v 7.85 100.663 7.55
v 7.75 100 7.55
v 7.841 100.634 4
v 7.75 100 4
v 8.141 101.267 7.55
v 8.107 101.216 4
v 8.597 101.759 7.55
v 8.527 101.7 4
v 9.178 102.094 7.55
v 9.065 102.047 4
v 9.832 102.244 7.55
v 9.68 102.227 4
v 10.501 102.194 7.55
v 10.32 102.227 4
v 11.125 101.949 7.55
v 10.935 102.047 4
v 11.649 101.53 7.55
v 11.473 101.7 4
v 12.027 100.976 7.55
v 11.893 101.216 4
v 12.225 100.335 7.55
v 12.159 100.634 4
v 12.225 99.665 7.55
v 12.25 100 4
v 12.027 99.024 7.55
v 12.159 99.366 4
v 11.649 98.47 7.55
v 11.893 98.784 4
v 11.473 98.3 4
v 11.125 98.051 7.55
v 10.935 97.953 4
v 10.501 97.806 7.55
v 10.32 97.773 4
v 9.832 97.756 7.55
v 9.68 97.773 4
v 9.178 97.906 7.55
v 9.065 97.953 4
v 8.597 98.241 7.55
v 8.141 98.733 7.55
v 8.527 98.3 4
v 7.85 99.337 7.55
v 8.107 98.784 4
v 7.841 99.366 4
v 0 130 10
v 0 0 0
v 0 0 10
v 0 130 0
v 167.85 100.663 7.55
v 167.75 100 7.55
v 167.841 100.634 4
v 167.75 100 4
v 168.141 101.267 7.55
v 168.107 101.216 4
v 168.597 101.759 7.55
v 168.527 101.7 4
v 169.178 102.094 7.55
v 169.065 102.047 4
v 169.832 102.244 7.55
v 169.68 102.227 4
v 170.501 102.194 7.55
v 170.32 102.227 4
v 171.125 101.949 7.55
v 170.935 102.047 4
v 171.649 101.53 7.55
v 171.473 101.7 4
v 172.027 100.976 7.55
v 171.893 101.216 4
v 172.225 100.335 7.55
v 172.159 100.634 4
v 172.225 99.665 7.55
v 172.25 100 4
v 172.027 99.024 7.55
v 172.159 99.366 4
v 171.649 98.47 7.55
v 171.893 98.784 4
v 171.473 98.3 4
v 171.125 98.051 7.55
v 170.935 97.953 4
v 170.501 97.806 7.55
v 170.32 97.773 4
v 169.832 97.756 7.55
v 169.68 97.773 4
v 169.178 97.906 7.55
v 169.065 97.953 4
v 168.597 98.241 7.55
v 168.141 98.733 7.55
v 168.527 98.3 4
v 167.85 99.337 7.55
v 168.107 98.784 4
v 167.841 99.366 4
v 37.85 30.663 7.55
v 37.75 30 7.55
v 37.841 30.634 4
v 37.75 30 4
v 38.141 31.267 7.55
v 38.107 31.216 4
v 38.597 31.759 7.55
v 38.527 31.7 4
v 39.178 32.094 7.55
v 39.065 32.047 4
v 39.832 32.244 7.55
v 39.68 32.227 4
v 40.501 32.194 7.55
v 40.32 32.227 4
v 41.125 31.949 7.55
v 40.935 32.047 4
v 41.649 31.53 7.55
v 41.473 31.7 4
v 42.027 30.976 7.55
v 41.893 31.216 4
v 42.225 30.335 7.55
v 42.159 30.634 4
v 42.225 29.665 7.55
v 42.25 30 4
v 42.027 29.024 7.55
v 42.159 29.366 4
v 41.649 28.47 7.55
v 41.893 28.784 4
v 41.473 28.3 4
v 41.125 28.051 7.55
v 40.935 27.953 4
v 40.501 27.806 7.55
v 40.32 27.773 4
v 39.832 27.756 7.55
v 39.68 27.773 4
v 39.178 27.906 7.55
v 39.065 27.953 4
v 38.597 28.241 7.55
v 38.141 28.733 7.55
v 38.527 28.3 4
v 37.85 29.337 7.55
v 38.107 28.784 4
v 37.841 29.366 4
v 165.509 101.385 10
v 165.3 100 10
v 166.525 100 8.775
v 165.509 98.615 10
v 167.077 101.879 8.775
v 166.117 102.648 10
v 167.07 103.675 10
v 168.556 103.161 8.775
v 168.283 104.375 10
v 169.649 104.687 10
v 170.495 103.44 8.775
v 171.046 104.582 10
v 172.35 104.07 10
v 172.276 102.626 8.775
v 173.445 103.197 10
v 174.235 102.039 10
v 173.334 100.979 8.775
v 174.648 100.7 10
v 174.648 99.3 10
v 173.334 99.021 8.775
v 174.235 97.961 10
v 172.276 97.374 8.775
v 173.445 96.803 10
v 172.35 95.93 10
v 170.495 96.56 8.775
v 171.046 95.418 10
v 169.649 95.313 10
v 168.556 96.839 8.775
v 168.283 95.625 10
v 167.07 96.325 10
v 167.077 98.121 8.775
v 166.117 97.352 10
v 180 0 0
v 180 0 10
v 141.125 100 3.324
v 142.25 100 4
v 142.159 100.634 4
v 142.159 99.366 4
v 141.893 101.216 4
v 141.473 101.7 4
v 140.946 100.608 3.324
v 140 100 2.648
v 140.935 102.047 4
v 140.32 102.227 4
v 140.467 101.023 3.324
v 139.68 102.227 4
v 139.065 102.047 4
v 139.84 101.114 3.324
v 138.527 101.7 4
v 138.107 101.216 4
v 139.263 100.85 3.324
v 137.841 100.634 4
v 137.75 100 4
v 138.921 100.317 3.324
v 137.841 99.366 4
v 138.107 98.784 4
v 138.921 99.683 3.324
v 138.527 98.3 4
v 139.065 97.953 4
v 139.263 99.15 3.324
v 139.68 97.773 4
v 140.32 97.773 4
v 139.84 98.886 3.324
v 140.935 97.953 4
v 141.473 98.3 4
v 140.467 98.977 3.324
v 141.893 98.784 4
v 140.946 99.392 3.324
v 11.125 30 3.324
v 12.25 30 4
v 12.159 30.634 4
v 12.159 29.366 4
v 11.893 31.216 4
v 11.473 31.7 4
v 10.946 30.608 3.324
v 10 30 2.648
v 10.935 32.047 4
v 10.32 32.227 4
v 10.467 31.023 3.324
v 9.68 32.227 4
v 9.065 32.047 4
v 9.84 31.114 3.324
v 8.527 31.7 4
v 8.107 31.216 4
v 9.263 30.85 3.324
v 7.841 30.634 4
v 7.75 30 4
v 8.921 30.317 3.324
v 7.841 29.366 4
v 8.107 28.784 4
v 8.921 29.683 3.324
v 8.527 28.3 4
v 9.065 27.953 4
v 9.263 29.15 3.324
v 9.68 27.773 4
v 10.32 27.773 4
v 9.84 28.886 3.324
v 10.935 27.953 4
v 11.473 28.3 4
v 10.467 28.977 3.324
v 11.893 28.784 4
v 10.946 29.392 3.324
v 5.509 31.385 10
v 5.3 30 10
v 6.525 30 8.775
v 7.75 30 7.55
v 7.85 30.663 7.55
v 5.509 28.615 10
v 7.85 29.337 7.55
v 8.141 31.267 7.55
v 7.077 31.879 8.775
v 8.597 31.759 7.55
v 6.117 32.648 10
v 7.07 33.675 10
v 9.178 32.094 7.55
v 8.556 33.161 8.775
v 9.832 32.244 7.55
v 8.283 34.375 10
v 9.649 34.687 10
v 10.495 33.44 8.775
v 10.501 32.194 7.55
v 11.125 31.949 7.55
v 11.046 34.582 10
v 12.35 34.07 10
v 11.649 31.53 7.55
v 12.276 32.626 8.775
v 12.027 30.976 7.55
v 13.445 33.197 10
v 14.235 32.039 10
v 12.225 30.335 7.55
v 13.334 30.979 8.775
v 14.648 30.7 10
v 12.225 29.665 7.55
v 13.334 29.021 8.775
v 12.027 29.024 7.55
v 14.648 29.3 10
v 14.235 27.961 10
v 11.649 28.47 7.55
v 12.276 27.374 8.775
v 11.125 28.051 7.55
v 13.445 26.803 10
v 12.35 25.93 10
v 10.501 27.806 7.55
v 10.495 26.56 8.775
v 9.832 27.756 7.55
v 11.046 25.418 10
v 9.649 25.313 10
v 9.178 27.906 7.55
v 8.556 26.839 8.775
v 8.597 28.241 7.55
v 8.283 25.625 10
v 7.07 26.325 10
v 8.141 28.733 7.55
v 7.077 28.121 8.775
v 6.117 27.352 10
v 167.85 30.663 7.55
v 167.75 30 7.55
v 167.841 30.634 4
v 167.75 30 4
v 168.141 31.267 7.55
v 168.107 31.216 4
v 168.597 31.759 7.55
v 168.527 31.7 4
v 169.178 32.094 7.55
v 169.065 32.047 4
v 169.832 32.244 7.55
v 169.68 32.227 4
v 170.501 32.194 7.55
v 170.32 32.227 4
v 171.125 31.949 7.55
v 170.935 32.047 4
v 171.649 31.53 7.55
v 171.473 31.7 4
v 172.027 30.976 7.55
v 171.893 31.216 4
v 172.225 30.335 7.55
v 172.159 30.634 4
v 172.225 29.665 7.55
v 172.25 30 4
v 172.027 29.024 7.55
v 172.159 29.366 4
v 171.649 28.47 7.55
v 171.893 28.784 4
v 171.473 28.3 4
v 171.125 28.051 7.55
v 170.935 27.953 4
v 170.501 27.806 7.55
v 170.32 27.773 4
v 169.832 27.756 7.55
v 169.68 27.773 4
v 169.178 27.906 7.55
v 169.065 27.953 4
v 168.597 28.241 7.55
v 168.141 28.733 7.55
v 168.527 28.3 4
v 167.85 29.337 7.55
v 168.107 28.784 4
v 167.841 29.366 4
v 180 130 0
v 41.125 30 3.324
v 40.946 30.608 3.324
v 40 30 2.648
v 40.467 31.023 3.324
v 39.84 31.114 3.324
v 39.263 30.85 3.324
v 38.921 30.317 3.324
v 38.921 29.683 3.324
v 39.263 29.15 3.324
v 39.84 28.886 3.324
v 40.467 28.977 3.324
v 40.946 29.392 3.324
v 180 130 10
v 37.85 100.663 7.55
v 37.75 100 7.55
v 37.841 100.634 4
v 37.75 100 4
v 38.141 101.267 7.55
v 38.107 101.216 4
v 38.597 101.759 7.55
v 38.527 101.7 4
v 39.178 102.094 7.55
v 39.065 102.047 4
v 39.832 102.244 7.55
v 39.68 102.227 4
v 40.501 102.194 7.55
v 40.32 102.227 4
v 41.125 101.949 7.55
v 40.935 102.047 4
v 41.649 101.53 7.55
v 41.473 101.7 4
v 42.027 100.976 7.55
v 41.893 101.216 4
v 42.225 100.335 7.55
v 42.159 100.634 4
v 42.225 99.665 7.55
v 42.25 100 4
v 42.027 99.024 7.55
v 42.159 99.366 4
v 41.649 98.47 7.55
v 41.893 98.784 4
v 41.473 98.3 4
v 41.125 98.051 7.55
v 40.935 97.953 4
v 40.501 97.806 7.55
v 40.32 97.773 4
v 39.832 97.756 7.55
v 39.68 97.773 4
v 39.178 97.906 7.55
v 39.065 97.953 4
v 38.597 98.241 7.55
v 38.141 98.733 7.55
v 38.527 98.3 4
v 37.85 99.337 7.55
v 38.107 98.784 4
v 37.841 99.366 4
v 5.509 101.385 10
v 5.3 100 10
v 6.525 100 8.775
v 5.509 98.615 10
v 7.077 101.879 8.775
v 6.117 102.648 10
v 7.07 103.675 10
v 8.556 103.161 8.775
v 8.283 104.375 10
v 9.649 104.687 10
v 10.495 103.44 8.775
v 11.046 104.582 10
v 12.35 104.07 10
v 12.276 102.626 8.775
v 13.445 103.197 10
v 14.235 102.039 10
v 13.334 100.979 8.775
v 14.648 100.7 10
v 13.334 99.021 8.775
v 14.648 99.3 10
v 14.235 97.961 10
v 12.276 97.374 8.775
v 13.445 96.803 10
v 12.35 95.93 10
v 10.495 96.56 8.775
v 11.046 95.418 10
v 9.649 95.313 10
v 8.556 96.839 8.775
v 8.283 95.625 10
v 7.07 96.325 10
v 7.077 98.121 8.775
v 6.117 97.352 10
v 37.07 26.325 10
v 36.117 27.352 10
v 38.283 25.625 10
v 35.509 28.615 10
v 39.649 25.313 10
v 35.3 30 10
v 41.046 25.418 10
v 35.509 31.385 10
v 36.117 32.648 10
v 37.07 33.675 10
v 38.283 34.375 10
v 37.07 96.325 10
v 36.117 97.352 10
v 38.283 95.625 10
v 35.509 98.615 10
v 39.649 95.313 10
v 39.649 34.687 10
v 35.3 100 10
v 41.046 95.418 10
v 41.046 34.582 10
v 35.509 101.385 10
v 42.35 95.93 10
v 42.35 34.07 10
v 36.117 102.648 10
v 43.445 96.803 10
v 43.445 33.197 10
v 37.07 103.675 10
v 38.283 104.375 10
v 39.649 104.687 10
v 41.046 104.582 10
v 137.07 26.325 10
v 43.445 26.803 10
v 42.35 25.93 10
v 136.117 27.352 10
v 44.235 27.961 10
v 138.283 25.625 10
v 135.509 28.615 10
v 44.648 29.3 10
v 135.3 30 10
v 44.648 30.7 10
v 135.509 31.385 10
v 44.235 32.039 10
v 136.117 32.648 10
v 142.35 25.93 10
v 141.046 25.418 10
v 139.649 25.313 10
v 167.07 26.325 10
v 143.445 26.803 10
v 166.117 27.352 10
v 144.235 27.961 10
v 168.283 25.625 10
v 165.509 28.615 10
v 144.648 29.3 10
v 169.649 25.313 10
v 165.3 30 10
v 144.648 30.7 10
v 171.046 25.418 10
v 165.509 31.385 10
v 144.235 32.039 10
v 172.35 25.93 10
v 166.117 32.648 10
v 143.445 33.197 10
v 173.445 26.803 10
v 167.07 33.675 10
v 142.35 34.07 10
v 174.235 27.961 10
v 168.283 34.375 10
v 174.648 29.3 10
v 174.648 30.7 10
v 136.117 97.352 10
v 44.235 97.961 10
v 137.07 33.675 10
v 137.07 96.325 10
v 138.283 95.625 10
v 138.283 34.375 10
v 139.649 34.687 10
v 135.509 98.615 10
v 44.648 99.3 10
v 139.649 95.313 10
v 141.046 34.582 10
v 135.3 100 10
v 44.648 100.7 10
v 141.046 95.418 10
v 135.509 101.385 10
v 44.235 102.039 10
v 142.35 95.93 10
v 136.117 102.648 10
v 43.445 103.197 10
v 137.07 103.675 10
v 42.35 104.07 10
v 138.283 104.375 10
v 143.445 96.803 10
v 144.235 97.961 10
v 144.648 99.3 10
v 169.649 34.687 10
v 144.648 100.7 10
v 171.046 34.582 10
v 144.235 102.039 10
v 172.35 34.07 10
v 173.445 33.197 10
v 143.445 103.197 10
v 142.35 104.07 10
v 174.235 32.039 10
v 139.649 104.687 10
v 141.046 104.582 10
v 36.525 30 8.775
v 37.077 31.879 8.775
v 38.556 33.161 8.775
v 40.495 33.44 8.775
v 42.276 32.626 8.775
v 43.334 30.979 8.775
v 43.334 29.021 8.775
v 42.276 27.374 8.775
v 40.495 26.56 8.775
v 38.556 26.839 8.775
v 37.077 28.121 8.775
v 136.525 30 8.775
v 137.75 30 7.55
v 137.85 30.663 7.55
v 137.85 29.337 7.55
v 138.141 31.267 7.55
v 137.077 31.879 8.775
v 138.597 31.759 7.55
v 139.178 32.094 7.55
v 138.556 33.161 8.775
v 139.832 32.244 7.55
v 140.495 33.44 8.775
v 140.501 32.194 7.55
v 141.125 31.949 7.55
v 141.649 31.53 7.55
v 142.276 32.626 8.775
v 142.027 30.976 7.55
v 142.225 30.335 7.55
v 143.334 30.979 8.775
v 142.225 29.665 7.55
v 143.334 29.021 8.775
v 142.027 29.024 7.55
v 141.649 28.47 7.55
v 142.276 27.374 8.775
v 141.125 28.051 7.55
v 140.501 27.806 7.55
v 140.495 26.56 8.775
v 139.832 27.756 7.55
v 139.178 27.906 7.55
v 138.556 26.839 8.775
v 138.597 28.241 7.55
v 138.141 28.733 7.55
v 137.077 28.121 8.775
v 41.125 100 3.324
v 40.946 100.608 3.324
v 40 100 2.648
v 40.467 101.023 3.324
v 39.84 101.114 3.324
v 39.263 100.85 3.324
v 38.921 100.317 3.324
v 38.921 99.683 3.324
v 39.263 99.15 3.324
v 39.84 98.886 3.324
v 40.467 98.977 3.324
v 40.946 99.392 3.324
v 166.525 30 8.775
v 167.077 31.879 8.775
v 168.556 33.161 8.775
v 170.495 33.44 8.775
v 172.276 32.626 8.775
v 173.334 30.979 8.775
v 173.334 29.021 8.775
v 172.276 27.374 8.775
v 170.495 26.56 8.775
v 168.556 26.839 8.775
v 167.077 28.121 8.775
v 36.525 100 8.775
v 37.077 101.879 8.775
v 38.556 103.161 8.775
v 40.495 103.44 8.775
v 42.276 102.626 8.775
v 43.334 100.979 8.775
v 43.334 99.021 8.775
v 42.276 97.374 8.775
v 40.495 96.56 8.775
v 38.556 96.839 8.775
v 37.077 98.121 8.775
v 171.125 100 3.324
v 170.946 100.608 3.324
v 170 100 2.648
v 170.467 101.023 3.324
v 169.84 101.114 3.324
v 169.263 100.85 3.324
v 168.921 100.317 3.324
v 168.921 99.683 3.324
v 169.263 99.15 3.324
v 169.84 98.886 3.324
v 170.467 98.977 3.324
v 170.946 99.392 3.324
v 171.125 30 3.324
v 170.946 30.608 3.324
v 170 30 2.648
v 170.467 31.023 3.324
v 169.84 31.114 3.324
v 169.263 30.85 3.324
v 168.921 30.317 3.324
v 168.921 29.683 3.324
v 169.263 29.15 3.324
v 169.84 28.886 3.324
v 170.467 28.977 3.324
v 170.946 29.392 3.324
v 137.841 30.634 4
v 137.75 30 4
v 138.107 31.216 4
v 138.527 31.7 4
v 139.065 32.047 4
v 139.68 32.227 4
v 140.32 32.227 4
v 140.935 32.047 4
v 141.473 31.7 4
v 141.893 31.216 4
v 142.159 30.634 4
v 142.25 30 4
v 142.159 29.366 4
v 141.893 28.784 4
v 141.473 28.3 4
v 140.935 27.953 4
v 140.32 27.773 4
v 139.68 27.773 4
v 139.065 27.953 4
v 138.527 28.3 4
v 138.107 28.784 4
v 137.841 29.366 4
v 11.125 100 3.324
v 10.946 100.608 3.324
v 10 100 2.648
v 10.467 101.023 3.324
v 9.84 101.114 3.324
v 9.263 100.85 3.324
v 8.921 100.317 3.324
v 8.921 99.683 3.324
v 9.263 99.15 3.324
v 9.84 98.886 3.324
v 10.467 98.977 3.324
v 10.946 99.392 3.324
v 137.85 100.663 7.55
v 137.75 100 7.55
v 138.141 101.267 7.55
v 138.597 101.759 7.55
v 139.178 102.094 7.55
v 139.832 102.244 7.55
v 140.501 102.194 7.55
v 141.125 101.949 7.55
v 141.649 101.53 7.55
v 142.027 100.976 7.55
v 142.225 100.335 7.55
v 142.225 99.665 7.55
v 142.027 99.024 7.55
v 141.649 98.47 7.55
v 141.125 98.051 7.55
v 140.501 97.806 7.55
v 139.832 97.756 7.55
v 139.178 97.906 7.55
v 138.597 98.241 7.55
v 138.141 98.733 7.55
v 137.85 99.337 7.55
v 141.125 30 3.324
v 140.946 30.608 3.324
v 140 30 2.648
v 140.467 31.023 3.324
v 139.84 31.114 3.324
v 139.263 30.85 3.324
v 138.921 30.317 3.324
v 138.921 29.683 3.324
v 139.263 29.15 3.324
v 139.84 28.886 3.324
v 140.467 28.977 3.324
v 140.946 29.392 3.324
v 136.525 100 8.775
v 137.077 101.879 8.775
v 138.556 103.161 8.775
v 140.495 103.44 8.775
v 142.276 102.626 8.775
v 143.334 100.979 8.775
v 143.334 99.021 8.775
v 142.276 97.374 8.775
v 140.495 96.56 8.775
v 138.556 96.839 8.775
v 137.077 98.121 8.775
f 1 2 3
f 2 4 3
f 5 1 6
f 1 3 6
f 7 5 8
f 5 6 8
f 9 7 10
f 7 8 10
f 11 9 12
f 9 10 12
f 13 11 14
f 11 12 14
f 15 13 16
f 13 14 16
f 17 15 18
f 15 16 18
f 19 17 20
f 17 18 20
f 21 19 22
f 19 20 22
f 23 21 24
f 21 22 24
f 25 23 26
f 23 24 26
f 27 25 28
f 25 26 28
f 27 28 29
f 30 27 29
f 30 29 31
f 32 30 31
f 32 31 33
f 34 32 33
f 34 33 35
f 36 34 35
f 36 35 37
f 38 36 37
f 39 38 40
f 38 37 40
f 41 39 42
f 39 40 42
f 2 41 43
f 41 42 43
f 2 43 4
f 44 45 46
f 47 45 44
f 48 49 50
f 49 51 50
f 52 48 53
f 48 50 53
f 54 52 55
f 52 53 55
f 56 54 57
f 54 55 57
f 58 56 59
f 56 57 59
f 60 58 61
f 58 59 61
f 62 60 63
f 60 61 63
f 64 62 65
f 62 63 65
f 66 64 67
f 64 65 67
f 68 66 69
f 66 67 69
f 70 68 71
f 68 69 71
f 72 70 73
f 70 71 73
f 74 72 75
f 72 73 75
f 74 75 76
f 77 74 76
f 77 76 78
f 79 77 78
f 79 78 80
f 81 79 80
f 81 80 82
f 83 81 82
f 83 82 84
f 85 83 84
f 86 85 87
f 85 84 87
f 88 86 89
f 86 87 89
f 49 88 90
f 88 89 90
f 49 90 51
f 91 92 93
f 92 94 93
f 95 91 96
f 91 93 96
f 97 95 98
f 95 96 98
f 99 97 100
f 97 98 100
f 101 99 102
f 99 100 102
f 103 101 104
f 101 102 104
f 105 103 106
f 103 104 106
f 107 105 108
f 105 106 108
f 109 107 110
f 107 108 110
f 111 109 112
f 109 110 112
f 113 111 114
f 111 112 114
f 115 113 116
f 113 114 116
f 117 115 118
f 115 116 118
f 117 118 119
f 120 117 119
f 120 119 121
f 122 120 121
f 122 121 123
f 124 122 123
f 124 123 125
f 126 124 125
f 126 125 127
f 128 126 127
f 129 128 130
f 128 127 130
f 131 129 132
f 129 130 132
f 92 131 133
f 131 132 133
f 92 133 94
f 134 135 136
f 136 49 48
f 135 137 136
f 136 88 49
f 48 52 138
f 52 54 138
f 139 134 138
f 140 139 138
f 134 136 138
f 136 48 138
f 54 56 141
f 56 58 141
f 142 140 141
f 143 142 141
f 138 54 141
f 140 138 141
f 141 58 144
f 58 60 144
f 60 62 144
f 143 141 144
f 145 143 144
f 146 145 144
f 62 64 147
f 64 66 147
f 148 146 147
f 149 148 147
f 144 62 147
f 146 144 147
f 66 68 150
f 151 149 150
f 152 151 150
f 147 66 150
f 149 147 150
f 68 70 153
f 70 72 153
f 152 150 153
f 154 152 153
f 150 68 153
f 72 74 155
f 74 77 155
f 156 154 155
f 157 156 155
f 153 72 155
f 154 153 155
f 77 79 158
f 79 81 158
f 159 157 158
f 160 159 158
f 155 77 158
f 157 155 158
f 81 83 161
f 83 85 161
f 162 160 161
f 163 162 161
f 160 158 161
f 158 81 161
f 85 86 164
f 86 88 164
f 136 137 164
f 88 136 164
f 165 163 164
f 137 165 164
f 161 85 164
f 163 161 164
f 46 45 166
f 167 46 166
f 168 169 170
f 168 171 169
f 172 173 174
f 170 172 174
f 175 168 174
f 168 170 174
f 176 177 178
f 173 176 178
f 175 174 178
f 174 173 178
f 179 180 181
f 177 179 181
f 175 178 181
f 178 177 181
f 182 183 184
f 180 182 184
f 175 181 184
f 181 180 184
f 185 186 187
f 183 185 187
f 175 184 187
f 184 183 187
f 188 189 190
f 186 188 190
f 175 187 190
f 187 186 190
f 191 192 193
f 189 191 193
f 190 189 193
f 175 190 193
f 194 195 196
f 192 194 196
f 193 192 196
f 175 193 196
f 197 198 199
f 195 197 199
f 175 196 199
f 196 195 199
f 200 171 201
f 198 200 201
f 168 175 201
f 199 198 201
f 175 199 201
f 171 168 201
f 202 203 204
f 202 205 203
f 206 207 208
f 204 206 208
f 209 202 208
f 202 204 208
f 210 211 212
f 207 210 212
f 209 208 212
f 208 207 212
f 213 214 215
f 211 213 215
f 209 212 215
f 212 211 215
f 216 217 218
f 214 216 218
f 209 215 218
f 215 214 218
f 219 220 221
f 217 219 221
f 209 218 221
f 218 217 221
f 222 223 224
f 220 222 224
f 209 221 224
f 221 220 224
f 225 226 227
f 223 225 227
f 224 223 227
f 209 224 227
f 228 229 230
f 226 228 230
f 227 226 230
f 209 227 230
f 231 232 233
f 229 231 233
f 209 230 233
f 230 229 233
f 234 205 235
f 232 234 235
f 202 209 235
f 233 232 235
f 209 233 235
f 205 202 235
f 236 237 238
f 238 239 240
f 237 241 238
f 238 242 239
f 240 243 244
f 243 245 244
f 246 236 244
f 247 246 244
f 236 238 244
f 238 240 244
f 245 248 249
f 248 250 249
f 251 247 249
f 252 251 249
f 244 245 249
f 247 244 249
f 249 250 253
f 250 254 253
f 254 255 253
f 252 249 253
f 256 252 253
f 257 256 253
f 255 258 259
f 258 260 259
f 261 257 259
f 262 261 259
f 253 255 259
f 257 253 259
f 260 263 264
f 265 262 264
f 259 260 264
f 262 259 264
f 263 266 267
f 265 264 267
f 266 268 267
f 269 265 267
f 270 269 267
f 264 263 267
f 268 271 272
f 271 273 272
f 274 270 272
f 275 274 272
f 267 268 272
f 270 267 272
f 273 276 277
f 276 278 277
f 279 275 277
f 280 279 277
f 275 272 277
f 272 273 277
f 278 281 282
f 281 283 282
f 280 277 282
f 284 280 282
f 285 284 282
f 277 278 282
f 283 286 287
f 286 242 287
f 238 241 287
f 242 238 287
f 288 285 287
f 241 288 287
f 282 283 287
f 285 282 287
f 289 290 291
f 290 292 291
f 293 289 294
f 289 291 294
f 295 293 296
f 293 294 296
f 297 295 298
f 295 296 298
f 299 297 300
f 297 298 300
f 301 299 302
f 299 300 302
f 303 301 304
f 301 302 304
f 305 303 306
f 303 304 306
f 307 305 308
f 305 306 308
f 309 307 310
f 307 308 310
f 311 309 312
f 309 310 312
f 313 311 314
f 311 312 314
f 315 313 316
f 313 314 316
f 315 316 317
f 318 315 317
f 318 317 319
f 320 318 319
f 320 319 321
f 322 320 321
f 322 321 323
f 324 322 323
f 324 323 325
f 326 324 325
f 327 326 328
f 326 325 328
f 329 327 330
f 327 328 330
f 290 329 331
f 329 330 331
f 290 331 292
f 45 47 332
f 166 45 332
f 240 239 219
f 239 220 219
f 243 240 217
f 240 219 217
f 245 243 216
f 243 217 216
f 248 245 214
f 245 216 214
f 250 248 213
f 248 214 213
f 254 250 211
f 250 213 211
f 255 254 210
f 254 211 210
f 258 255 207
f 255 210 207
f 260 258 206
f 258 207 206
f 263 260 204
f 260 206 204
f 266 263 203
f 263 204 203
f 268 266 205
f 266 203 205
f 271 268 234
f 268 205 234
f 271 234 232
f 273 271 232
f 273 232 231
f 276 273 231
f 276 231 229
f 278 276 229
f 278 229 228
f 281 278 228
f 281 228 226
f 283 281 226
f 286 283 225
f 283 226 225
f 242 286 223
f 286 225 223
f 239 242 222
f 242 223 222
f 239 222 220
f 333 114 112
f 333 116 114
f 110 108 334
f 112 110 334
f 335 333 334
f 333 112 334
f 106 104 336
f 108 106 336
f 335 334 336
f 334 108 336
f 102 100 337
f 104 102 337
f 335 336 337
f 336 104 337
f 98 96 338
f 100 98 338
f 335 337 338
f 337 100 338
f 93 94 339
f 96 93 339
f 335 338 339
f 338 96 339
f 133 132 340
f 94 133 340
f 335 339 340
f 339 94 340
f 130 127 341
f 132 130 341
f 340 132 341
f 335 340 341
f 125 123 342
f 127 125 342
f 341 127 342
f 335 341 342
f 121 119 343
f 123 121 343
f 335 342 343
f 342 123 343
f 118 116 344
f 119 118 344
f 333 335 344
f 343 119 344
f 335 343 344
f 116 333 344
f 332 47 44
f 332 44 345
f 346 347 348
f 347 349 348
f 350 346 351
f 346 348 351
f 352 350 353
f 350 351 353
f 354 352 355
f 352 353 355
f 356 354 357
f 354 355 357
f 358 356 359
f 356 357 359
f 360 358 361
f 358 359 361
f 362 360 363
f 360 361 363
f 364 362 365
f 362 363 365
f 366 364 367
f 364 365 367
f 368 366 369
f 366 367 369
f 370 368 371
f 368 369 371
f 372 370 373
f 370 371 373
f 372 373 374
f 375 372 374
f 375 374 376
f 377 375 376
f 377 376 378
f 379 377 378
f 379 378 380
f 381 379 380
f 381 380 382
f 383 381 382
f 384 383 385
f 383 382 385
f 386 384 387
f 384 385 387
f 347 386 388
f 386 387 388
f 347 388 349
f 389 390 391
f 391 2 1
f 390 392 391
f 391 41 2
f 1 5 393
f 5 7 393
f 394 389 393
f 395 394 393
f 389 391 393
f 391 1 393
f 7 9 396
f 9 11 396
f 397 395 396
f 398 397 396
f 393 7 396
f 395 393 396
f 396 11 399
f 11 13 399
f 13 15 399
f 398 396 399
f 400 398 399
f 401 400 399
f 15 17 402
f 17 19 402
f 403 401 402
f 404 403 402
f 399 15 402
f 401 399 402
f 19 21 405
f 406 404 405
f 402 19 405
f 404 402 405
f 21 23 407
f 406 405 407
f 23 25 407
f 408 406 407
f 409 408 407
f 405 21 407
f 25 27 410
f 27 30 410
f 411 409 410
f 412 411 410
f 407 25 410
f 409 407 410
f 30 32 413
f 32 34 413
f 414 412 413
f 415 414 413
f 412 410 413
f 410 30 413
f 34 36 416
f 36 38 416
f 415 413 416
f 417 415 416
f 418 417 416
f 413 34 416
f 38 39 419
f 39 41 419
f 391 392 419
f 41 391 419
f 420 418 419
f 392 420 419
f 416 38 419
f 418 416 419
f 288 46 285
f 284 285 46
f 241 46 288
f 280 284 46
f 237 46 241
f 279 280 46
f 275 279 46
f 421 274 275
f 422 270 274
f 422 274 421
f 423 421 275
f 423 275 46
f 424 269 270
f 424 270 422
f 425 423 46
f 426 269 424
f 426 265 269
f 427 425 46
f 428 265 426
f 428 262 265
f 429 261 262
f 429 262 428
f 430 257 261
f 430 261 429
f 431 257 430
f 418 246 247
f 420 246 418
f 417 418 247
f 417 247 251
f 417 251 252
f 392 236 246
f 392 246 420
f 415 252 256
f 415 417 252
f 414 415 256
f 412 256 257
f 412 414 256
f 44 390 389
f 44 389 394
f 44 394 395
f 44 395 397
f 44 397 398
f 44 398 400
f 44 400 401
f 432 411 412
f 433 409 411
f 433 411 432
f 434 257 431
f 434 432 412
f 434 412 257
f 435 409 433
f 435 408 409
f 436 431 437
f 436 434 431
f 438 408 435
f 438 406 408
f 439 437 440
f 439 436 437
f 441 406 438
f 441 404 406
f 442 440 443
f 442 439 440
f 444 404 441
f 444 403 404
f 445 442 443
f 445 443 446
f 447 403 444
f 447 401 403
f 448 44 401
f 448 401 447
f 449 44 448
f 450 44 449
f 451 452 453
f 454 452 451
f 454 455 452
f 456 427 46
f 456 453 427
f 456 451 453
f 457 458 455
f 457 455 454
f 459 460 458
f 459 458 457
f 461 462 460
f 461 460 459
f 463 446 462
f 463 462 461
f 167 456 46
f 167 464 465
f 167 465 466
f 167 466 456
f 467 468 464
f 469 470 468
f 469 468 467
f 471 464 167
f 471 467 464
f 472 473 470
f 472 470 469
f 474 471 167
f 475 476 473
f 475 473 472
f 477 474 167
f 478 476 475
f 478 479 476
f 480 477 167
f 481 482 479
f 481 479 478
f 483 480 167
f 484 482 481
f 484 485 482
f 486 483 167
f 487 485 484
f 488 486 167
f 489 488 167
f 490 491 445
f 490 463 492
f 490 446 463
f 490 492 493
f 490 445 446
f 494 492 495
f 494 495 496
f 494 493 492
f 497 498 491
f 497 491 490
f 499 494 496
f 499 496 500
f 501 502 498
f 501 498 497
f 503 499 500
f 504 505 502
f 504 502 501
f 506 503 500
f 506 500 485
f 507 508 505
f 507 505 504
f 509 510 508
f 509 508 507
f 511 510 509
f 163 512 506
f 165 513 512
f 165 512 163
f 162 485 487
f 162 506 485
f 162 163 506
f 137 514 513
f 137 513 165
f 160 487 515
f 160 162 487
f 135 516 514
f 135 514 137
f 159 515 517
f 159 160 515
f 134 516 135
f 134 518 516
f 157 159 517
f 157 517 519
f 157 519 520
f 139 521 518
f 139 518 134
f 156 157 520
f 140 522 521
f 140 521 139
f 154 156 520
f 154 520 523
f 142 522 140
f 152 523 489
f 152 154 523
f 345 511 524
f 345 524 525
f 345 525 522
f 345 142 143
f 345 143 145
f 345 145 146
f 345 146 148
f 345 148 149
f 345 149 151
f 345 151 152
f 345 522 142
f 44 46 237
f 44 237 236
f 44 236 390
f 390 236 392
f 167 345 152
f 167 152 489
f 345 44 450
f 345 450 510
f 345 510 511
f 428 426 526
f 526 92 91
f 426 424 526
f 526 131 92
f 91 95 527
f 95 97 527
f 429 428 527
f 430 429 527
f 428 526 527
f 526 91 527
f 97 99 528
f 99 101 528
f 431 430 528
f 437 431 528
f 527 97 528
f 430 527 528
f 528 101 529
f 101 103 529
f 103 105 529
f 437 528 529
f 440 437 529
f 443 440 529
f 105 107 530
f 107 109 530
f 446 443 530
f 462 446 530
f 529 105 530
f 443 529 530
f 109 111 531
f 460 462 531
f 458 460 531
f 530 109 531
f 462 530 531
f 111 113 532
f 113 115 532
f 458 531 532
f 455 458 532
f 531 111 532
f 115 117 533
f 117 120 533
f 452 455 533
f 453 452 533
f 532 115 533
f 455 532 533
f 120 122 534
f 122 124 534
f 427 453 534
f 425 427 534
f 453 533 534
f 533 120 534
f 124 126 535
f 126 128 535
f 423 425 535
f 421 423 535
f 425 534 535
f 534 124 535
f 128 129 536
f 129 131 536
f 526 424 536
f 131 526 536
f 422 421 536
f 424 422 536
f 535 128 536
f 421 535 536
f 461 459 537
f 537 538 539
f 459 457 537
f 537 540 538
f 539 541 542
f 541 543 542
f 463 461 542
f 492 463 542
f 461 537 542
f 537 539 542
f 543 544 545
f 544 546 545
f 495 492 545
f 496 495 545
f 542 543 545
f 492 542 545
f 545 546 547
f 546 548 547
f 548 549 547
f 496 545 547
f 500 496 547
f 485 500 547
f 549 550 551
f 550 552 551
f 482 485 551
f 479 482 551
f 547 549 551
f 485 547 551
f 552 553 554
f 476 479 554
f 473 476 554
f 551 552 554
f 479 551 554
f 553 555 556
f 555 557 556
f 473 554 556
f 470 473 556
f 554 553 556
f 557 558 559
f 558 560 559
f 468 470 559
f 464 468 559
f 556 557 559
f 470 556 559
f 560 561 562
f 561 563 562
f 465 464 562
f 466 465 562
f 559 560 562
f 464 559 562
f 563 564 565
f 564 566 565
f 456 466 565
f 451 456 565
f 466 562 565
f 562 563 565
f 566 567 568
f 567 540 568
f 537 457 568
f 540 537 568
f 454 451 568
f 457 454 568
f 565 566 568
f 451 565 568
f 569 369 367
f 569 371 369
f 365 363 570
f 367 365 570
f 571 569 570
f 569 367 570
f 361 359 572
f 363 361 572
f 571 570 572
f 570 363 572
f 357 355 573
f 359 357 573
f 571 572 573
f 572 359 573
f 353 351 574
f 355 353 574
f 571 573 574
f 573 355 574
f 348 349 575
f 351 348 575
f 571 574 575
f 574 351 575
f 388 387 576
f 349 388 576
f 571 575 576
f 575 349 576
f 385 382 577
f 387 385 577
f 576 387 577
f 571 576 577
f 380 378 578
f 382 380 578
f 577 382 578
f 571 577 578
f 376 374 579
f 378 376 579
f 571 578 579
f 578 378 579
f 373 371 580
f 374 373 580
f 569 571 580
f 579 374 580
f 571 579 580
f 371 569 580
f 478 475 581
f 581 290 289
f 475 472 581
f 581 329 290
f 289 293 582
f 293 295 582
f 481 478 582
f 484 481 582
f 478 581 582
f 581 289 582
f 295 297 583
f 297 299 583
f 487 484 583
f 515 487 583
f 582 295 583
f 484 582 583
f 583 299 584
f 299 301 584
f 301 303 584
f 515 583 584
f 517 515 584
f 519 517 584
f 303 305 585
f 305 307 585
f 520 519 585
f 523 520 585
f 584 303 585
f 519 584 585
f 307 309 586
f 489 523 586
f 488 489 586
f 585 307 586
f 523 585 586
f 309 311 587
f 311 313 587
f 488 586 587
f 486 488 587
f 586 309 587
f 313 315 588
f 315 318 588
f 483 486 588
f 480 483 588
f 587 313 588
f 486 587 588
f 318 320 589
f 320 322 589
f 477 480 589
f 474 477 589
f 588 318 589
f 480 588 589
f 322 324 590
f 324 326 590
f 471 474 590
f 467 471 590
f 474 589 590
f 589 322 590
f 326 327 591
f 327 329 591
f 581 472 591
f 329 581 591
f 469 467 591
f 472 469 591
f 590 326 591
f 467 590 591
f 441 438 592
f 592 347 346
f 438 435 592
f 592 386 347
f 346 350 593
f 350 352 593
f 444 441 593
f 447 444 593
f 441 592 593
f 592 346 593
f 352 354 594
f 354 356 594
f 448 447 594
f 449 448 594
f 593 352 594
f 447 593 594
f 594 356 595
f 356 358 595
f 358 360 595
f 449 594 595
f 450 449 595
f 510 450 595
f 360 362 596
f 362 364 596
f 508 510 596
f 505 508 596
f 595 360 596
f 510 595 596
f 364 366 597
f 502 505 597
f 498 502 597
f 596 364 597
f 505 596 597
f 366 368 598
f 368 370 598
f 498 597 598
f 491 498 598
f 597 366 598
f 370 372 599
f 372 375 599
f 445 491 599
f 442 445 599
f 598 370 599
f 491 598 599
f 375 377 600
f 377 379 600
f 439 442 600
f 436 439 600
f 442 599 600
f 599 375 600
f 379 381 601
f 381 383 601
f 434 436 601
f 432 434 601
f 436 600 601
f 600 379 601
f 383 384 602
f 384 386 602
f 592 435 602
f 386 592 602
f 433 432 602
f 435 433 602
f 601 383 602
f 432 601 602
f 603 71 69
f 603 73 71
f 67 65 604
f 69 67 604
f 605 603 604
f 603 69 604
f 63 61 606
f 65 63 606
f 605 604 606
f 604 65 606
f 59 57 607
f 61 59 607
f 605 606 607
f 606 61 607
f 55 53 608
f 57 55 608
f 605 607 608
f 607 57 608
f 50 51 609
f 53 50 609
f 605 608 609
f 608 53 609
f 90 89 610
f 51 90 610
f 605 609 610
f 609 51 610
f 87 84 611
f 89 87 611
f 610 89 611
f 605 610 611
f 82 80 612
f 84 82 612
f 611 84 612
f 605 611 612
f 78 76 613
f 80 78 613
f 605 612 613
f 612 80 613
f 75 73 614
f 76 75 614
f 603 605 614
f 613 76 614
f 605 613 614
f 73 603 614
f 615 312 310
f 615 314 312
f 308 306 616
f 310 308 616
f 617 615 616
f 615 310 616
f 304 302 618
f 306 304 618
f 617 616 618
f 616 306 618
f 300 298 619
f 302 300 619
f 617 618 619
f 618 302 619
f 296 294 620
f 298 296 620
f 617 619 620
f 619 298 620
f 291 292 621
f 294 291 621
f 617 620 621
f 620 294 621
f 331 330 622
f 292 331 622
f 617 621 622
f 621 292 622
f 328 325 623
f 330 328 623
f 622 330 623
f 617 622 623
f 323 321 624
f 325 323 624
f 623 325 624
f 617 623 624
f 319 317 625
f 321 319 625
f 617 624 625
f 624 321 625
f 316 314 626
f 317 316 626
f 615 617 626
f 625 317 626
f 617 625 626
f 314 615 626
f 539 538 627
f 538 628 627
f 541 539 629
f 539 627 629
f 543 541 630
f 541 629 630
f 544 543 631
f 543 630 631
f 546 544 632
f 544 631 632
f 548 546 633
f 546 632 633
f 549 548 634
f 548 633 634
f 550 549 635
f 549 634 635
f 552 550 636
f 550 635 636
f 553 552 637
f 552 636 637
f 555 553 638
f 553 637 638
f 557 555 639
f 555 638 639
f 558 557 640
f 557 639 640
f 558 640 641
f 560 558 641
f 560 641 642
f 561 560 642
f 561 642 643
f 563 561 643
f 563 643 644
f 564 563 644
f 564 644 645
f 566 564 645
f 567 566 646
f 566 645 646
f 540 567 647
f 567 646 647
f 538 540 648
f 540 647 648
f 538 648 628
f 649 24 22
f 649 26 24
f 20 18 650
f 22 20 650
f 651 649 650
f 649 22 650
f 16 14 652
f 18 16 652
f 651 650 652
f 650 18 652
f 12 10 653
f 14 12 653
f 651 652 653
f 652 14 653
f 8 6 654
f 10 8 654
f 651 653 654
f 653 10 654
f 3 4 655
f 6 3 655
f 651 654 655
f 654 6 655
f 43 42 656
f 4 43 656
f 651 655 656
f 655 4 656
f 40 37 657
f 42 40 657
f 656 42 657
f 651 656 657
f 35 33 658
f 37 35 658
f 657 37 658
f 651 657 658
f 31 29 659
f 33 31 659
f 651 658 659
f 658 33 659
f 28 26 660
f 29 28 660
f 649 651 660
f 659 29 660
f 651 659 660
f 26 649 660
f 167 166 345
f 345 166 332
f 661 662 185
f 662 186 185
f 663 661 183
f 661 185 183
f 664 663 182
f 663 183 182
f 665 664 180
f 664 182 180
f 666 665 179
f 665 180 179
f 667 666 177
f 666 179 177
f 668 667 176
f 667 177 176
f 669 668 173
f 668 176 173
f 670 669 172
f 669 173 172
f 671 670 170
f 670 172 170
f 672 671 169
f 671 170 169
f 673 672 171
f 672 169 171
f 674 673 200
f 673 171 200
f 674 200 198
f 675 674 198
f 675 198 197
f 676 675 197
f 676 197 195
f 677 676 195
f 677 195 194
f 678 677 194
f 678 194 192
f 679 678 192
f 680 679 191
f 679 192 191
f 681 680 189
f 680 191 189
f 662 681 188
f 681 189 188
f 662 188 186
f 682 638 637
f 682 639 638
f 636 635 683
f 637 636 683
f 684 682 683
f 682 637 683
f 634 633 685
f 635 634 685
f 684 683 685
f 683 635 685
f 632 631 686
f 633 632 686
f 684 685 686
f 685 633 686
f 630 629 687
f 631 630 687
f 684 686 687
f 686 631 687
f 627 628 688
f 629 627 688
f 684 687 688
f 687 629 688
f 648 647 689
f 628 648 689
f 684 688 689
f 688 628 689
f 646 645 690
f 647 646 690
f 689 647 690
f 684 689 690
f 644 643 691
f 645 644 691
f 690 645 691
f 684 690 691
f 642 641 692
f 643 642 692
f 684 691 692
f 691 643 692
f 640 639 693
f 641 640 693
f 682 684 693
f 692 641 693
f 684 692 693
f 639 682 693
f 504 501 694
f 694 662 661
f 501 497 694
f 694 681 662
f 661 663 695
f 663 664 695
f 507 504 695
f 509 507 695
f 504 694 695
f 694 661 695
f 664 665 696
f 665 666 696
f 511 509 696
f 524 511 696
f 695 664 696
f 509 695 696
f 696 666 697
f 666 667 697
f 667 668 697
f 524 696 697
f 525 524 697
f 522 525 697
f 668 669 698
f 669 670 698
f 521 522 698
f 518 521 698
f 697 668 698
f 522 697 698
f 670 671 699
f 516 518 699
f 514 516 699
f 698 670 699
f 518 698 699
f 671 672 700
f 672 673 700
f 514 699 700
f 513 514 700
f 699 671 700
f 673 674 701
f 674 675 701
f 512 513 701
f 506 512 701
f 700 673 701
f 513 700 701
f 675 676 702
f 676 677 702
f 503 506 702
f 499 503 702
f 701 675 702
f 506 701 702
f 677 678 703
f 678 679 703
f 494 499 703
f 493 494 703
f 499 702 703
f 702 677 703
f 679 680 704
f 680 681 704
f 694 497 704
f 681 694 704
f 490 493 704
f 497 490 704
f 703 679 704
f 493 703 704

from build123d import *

# Parameters (mm, degrees)
SKETCH1_W                                           = 180
SKETCH1_H                                           = 130
BOSS_EXTRUDE1_DEPTH                                 = 10
CSK_FOR_M4_COUNTERSUNK_FLAT_HEAD_SCREW1_D           = 4.5
CSK_FOR_M4_COUNTERSUNK_FLAT_HEAD_SCREW1_DEPTH       = 6
CSK_FOR_M4_COUNTERSUNK_FLAT_HEAD_SCREW1_CSINK_D     = 9.4
CSK_FOR_M4_COUNTERSUNK_FLAT_HEAD_SCREW1_CSINK_ANGLE = 90
CSK_FOR_M4_COUNTERSUNK_FLAT_HEAD_SCREW1_TIP         = 1.351936393


with BuildPart() as part:
    # Sketch1 → Boss-Extrude1 (new body)
    with BuildSketch(Plane.XY):
        with Locations((90, 65)):
            Rectangle(SKETCH1_W, SKETCH1_H)
    extrude(amount=BOSS_EXTRUDE1_DEPTH)

    # CSK for M4 Countersunk Flat Head Screw1
    with Locations(Plane.XY.offset(10)):
        with Locations((10, 100), (40, 100), (10, 30), (40, 30), (140, 100), (170, 100), (140, 30), (170, 30)):
            CounterSinkHole(CSK_FOR_M4_COUNTERSUNK_FLAT_HEAD_SCREW1_D / 2, CSK_FOR_M4_COUNTERSUNK_FLAT_HEAD_SCREW1_CSINK_D / 2, depth=CSK_FOR_M4_COUNTERSUNK_FLAT_HEAD_SCREW1_DEPTH, counter_sink_angle=CSK_FOR_M4_COUNTERSUNK_FLAT_HEAD_SCREW1_CSINK_ANGLE)
            with Locations((0, 0, -(CSK_FOR_M4_COUNTERSUNK_FLAT_HEAD_SCREW1_DEPTH + CSK_FOR_M4_COUNTERSUNK_FLAT_HEAD_SCREW1_TIP / 2))):  # 118° drill point
                Cone(0, CSK_FOR_M4_COUNTERSUNK_FLAT_HEAD_SCREW1_D / 2, CSK_FOR_M4_COUNTERSUNK_FLAT_HEAD_SCREW1_TIP, mode=Mode.SUBTRACT)


solid = part.part
